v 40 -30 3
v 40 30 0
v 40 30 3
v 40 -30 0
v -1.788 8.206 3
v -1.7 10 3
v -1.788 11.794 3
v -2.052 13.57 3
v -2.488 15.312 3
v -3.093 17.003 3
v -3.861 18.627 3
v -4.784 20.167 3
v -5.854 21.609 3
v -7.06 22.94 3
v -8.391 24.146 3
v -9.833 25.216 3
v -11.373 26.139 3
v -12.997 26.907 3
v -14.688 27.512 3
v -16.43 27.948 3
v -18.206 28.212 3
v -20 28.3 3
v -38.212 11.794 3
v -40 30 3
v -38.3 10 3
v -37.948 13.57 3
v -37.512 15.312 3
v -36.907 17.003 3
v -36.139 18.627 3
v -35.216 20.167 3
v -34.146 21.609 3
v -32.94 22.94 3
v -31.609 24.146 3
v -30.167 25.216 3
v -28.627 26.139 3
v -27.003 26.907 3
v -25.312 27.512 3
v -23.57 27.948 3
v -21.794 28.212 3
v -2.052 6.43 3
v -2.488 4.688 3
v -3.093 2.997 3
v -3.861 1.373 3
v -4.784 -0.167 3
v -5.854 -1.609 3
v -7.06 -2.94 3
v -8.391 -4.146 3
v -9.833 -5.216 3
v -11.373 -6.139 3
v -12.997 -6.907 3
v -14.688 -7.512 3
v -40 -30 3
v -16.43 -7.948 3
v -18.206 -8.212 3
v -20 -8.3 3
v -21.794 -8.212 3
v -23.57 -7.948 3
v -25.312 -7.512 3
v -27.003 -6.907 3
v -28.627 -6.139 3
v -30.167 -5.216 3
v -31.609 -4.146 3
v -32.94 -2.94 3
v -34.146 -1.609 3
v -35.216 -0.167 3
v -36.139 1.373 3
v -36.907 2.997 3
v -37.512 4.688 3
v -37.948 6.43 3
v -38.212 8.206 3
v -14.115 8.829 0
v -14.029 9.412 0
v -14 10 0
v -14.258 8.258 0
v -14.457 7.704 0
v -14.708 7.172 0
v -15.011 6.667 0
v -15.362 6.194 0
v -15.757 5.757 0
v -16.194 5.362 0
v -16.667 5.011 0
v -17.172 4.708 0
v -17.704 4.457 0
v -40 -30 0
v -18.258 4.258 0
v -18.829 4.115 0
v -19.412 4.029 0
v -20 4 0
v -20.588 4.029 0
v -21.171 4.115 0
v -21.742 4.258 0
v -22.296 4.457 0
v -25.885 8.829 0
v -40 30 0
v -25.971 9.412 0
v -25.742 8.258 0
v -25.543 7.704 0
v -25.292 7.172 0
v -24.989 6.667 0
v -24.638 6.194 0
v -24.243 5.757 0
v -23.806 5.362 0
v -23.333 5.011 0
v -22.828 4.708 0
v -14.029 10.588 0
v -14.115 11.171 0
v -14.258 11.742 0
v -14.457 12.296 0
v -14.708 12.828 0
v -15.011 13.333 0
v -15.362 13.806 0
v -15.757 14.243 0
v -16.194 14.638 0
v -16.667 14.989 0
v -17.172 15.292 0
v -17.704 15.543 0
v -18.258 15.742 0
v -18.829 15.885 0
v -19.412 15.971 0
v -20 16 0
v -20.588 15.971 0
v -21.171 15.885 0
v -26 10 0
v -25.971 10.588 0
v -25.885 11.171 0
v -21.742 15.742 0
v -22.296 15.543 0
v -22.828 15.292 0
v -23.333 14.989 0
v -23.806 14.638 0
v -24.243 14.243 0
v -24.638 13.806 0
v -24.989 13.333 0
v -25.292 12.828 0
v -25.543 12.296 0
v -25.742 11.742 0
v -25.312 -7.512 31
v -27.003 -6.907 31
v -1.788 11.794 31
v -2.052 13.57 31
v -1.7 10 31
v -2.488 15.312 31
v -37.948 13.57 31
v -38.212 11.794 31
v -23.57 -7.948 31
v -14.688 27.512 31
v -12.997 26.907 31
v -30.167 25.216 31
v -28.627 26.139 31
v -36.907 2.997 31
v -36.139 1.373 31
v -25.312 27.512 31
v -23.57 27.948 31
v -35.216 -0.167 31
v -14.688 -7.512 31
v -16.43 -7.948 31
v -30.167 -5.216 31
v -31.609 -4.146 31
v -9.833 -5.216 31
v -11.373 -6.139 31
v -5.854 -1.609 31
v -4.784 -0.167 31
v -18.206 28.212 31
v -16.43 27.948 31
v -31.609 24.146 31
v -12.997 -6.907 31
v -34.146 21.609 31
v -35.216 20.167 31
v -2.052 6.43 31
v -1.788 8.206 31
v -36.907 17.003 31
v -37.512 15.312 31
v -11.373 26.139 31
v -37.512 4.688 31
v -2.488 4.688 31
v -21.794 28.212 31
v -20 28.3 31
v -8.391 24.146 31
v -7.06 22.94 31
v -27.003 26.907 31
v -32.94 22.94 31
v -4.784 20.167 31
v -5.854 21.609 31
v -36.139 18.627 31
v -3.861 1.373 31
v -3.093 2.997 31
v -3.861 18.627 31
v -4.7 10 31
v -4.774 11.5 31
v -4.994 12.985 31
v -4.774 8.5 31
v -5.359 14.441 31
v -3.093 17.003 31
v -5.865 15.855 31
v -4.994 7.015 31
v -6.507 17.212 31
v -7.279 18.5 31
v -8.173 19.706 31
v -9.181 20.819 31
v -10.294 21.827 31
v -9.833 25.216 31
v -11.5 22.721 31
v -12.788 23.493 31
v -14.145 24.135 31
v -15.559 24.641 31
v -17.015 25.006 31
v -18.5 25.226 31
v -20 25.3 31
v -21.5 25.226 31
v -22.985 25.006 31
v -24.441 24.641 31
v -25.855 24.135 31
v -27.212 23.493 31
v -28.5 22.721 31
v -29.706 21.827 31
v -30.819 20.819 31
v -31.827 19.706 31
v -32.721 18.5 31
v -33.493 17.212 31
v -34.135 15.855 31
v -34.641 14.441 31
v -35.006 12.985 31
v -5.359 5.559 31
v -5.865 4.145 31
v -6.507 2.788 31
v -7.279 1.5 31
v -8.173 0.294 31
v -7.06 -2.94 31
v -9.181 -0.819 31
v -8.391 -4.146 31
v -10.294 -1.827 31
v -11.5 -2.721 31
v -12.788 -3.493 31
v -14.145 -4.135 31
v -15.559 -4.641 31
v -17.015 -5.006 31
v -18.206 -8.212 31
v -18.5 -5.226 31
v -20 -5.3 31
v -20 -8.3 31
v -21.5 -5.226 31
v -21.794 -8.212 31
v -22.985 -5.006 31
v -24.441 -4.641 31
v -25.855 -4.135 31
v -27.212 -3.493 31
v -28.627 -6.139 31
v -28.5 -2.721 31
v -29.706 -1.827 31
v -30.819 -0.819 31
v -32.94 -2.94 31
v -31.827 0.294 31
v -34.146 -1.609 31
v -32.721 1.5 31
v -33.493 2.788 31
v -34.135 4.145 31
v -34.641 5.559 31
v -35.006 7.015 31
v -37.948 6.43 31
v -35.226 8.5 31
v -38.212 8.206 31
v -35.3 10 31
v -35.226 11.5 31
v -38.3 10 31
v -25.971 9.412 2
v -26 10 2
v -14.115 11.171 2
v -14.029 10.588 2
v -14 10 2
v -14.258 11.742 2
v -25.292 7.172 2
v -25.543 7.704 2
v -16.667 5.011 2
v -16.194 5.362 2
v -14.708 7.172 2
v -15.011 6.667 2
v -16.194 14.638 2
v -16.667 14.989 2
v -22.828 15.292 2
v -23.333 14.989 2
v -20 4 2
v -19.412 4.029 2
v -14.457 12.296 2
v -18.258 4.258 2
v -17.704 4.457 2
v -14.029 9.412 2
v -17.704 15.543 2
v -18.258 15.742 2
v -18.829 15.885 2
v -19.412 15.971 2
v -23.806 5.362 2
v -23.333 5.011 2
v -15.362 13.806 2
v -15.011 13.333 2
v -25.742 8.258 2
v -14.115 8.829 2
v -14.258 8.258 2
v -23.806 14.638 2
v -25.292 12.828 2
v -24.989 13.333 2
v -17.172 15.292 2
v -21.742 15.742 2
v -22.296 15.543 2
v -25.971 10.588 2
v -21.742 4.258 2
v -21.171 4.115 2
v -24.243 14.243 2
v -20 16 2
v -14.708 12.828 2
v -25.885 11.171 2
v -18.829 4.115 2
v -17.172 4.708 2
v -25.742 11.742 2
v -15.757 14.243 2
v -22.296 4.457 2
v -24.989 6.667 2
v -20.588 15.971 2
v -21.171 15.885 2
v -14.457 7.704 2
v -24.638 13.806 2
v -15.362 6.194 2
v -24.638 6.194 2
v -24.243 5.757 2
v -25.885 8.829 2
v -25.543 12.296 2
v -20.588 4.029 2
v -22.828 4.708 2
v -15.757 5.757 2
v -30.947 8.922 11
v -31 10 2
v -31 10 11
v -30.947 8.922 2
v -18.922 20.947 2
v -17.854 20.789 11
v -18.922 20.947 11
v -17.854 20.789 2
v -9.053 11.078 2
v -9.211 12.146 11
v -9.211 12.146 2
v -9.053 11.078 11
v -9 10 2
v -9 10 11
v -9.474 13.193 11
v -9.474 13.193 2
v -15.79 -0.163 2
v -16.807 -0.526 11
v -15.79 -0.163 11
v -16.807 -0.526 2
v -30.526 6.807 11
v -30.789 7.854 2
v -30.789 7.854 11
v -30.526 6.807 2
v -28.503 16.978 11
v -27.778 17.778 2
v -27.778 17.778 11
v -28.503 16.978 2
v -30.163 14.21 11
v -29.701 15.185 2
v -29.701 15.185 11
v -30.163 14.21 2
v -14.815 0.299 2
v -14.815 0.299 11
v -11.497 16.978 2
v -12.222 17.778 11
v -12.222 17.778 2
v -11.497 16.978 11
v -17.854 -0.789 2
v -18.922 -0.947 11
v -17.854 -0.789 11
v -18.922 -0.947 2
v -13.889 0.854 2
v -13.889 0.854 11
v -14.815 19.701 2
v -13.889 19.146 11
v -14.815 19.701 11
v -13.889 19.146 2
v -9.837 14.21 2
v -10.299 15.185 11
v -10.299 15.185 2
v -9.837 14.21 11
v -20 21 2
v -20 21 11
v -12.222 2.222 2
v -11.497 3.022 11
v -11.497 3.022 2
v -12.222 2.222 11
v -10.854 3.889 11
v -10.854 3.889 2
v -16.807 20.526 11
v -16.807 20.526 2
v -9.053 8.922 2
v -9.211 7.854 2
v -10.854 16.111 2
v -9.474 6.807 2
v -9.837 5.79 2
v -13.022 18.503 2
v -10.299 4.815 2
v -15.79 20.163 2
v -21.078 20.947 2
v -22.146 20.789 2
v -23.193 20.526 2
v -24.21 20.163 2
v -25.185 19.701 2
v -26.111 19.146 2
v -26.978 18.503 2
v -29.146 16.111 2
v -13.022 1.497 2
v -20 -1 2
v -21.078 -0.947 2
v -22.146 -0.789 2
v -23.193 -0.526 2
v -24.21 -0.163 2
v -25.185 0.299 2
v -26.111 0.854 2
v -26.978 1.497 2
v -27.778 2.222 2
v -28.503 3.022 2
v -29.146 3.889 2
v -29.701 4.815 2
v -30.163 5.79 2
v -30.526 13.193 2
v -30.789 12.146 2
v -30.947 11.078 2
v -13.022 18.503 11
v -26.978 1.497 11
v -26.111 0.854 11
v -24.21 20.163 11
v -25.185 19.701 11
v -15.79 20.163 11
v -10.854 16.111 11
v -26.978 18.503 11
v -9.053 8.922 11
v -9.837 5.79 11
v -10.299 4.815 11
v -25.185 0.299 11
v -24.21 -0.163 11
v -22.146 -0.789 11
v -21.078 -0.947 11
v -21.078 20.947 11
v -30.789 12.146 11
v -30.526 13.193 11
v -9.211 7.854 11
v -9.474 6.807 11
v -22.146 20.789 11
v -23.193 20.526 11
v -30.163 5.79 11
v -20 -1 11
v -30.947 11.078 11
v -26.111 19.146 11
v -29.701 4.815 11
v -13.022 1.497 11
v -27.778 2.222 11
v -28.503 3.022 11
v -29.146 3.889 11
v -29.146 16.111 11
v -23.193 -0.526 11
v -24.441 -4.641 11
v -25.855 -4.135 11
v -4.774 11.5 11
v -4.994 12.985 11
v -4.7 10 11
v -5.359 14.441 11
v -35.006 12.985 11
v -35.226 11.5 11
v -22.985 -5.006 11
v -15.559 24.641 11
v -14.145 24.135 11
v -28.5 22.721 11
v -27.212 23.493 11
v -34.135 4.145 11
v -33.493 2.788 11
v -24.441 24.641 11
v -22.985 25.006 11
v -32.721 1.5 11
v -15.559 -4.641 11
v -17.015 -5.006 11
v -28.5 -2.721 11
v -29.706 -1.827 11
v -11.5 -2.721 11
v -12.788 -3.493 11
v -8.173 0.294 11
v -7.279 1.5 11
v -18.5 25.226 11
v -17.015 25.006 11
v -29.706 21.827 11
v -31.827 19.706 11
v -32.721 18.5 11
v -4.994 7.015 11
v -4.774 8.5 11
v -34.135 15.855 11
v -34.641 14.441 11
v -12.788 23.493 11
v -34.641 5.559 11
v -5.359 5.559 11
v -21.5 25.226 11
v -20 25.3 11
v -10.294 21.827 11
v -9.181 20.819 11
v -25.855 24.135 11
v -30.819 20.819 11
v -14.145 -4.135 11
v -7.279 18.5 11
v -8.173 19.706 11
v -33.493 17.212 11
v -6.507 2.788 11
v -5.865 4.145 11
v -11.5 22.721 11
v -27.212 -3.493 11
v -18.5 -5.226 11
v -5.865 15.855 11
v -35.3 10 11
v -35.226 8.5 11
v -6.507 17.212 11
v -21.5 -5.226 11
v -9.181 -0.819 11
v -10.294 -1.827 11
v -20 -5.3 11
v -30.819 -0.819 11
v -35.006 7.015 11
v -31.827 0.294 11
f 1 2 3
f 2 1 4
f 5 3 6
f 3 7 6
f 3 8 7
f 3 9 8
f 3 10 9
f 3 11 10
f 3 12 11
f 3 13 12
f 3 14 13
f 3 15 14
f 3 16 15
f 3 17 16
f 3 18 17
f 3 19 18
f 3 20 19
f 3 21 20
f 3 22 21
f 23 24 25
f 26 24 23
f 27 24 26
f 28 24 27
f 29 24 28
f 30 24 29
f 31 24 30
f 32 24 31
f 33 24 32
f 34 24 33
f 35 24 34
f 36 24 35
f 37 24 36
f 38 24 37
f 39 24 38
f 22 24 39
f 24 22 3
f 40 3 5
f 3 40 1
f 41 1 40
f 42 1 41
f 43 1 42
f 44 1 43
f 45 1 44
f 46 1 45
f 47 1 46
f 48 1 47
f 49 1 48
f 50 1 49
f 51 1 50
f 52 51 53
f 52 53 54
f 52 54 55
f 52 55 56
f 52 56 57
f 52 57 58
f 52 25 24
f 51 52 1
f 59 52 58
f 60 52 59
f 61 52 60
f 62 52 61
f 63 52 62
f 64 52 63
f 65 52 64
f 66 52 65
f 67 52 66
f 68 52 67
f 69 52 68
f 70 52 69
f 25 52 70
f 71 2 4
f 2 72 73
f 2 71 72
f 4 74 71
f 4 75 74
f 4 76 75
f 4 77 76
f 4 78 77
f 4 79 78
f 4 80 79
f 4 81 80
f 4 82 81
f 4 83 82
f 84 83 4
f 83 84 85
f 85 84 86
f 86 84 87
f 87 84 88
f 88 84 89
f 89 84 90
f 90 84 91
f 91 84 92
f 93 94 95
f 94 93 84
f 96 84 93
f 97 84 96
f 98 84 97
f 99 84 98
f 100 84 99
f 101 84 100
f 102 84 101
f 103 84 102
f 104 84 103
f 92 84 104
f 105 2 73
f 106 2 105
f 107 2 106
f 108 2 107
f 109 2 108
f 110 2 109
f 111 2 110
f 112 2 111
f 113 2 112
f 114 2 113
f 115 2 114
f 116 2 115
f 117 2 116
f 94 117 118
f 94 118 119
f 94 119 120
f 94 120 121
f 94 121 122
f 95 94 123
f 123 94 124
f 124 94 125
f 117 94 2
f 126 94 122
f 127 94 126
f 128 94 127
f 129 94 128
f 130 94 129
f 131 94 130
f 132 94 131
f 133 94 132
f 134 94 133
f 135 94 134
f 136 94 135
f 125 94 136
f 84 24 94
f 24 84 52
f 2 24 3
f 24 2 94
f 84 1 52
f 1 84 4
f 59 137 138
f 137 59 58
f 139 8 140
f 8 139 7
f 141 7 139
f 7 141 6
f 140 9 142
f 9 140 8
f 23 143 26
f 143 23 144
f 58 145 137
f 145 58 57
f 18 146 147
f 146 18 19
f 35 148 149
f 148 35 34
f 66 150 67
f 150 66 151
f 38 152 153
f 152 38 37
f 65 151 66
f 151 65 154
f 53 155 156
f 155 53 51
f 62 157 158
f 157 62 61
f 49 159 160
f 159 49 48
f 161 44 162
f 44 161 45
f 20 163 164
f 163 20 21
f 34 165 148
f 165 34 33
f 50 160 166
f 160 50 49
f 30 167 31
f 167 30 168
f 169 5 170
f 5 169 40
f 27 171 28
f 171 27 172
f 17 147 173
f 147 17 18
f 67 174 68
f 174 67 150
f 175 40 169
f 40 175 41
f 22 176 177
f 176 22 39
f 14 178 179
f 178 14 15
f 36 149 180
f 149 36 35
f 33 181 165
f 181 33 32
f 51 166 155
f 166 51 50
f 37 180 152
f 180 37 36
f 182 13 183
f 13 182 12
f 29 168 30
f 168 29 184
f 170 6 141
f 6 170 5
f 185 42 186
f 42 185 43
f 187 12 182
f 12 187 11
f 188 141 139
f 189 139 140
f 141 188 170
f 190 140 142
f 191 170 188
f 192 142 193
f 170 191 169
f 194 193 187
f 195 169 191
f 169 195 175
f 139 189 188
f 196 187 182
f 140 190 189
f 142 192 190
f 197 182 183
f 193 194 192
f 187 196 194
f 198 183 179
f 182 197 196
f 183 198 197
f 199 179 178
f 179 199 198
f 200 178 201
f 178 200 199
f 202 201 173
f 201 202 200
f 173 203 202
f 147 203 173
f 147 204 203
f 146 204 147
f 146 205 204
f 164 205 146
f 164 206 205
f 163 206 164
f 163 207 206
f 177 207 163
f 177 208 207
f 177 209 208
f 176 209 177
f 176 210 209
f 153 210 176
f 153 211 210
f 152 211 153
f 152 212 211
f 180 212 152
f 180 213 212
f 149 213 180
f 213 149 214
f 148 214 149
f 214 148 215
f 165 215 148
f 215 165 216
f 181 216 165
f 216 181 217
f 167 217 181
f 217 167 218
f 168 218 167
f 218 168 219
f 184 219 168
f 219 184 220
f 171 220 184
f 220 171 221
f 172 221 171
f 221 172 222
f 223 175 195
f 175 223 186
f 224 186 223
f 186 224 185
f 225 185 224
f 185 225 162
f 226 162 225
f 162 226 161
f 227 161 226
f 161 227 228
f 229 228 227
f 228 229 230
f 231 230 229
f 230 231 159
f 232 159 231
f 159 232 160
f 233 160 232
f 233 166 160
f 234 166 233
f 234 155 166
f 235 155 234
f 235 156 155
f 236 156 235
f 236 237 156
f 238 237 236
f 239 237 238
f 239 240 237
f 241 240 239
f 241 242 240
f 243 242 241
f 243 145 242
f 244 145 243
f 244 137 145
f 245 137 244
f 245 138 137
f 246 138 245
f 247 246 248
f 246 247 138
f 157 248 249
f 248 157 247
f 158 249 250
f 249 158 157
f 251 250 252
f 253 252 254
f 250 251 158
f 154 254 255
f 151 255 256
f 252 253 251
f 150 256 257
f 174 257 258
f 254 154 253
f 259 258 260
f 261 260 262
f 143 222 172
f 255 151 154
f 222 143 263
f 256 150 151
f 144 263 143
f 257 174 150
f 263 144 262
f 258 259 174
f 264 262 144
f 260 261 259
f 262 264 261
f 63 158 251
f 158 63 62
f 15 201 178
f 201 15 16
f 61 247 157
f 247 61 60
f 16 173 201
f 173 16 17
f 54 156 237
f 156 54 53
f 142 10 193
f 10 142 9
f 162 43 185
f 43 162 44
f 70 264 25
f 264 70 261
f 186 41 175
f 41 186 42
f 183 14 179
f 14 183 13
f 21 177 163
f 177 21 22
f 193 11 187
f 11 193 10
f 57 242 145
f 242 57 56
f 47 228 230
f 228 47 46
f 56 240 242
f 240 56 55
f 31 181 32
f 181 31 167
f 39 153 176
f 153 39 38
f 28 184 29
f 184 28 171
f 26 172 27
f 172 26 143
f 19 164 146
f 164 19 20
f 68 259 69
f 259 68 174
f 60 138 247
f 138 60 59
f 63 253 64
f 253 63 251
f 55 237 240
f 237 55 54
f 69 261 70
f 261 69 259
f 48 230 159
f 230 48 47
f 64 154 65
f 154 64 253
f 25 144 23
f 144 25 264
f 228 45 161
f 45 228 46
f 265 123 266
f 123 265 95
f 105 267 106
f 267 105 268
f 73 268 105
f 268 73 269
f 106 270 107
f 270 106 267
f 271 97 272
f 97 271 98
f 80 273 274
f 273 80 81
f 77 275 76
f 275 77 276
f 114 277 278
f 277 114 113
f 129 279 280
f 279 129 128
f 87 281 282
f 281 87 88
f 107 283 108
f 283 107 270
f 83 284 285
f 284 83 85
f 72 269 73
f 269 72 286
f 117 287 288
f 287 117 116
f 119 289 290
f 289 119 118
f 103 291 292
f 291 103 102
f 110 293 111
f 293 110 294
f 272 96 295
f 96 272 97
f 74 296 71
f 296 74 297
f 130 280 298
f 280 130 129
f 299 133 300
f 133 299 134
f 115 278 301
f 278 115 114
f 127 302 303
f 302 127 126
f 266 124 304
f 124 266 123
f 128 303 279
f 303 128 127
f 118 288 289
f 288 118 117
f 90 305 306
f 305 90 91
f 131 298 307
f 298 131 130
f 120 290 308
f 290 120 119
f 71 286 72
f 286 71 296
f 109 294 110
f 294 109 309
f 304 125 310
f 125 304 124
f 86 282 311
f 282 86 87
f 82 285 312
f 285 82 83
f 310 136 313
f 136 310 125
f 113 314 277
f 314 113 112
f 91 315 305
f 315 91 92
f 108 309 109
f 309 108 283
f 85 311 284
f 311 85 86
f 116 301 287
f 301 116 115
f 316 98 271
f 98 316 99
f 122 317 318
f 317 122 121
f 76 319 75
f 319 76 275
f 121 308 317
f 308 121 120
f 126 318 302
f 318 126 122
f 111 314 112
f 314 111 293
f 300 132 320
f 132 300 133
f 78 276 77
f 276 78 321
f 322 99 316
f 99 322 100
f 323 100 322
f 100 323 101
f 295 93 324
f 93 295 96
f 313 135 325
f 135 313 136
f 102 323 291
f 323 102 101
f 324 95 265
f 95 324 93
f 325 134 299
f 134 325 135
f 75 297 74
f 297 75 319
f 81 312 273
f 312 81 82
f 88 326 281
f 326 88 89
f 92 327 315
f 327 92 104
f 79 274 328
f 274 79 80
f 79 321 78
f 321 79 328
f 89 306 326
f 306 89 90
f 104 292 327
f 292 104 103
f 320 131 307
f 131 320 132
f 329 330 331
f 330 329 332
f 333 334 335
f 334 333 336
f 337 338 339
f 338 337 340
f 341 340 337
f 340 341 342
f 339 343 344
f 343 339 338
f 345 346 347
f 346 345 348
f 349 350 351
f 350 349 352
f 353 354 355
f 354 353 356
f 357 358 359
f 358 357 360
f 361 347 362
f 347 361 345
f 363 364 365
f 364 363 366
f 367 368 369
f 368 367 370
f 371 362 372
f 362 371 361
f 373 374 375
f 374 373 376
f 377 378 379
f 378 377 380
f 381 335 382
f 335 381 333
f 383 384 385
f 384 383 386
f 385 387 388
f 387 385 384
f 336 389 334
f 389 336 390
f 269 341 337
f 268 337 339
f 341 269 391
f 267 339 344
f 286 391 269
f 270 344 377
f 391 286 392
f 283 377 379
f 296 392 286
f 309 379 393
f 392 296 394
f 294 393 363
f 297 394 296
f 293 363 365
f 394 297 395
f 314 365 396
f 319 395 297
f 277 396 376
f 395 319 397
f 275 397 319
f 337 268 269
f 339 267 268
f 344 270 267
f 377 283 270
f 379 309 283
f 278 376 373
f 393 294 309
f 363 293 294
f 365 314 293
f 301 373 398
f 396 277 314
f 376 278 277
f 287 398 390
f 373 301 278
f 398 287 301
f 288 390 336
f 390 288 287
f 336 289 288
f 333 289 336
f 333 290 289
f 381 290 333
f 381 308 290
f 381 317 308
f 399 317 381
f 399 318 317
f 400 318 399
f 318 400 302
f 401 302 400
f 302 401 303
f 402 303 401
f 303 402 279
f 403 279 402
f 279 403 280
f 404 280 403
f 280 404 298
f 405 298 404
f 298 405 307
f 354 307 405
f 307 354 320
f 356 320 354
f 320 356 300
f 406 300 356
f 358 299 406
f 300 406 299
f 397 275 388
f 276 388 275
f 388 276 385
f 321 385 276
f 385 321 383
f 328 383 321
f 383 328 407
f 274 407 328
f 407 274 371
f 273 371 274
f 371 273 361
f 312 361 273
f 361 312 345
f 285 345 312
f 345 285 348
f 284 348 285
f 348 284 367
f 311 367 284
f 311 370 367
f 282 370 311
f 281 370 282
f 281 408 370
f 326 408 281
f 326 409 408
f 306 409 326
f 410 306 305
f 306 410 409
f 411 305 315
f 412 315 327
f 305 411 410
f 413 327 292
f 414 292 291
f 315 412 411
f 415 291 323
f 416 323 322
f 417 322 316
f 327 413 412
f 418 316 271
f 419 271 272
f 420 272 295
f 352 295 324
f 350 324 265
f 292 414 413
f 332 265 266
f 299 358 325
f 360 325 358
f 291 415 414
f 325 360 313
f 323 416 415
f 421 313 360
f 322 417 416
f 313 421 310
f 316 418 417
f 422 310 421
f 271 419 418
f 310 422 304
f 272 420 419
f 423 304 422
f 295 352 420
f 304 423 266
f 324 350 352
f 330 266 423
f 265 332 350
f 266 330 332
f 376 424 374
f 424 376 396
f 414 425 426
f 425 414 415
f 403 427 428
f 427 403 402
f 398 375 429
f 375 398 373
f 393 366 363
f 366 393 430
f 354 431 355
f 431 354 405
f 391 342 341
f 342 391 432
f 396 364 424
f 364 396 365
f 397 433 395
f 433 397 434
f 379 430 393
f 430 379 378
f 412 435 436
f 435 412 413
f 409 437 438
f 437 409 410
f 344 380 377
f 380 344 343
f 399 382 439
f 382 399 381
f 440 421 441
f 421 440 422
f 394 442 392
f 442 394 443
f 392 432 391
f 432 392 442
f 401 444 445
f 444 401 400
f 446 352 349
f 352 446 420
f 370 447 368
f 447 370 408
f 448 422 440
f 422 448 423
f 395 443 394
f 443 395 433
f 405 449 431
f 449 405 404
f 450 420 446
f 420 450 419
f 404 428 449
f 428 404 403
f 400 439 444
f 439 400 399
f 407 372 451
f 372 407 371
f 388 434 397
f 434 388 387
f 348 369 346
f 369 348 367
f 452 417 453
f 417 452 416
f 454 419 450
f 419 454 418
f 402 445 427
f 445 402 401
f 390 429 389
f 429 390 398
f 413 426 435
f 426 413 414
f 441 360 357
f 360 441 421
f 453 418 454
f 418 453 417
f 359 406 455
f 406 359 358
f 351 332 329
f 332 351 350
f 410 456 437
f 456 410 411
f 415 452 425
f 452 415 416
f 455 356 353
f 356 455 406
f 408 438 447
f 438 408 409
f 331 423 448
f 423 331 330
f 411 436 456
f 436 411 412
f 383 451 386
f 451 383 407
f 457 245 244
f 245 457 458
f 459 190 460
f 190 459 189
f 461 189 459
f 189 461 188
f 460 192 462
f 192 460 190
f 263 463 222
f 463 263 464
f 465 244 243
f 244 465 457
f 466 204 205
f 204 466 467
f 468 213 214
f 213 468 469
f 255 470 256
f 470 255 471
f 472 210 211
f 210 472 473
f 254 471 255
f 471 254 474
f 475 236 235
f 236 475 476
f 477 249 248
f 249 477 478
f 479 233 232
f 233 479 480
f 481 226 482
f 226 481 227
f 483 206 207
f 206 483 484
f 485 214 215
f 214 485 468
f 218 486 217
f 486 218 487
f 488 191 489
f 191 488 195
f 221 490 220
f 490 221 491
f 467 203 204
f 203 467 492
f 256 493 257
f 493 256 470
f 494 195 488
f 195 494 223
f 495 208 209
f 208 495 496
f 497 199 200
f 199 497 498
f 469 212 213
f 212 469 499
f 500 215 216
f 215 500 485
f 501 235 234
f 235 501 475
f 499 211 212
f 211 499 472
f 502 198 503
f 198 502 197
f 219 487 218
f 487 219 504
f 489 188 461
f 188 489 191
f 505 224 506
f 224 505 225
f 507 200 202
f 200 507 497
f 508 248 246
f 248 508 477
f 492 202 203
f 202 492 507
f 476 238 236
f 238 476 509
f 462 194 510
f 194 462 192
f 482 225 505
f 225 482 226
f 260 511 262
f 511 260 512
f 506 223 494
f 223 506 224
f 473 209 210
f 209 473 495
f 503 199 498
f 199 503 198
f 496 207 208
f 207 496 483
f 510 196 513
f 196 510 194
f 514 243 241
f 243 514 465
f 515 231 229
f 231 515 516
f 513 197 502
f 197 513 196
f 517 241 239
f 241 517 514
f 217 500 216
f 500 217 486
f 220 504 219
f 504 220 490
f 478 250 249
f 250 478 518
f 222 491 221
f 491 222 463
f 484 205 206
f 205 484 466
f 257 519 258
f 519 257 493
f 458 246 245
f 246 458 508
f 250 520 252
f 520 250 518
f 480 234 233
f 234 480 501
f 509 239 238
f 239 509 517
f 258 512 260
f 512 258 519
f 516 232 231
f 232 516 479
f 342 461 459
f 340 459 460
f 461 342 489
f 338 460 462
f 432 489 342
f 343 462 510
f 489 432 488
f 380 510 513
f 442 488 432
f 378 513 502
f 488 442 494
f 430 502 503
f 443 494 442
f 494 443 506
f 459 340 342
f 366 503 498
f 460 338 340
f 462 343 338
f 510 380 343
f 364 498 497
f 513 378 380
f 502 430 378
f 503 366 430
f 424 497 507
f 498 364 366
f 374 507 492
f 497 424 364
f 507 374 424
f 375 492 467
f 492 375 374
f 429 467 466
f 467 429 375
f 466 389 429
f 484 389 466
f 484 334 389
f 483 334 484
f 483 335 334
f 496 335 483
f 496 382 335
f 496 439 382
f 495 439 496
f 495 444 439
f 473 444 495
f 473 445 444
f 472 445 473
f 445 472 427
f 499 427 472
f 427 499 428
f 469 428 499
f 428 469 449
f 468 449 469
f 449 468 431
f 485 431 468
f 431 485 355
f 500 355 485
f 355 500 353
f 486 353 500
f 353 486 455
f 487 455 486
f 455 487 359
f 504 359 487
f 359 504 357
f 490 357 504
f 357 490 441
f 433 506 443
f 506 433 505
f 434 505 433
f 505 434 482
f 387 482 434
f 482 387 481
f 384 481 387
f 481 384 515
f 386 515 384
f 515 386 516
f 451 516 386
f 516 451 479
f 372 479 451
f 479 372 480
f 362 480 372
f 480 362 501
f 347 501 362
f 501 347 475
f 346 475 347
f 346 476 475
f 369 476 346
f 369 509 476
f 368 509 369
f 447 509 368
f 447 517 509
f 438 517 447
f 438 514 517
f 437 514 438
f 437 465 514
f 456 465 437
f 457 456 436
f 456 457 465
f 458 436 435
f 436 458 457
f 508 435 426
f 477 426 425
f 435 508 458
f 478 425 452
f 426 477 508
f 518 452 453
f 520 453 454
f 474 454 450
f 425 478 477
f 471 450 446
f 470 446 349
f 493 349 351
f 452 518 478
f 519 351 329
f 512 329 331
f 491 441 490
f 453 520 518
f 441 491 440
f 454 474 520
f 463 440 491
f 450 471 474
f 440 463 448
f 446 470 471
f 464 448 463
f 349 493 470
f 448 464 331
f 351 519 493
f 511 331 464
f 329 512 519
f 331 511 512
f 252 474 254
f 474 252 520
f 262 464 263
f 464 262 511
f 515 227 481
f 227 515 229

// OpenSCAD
// Adapter: phone camera over microscope eyepiece (30 mm OD), printed phone-side down
// All dimensions in mm, measured with calipers.

// ---- Plate ----
plate_x = 80;   // plate length in X
plate_y = 60;   // plate width in Y
plate_t = 3;    // plate thickness (z = 0..3)
cam_hole_d = 12;    // camera through-hole diameter
cam_hole_x = -20;   // camera hole centre X
cam_hole_y = 10;    // camera hole centre Y

// ---- Sleeve (on camera-hole axis) ----
sleeve_od = 36.6;   // sleeve outer diameter
sleeve_z0 = 3;      // sleeve base (sits on plate top)
sleeve_z1 = 31;     // sleeve top (open)
bore1_d = 22;       // lower bore (camera stop) diameter
bore1_z0 = 3;       // lower bore start
bore1_z1 = 11;      // lower bore end
bore2_d = 30.6;     // upper bore (slides over 30 mm eyepiece) diameter
bore2_z0 = 11;      // upper bore start
bore2_z1 = 31;      // upper bore end (open top)

// ---- M3 centring screw holes ----
screw_hole_d = 2.5;   // radial hole diameter
screw_z = 21;         // hole axis height
screw_n = 3;          // number of radial holes
screw_start = 0;      // first hole points +X

$fn = 64;

// ===================== BODY =====================
module body() { union() {
    // Flat plate on the bed, centred on origin
    translate([-plate_x/2, -plate_y/2, 0])
        cube([plate_x, plate_y, plate_t]);

    // Round sleeve standing on the plate, on the camera-hole axis
    translate([cam_hole_x, cam_hole_y, 0])
        cylinder(h = sleeve_z1, d = sleeve_od, center = false);
} }

// ===================== CUTS =====================
module cuts() { union() {
    // Camera through-hole in the plate (extends 1 mm past each face)
    translate([cam_hole_x, cam_hole_y, -1])
        cylinder(h = plate_t + 2, d = cam_hole_d, center = false);

    // Lower bore (camera stop) - extends 1 mm below plate and 0.5 mm into upper bore
    translate([cam_hole_x, cam_hole_y, bore1_z0 - 1])
        cylinder(h = (bore1_z1 - bore1_z0) + 1.5, d = bore1_d, center = false);

    // Upper bore (slides over eyepiece) - extends 1 mm past open top
    translate([cam_hole_x, cam_hole_y, bore2_z0])
        cylinder(h = (bore2_z1 - bore2_z0) + 1, d = bore2_d, center = false);

    // Three radial 2.5 mm M3 centring-screw holes, 120 deg apart, first in +X
    for (i = [0 : screw_n - 1]) {
        a = screw_start + i * 360 / screw_n;
        // Cylinder axis along local X, rotated about Z by a, centred on sleeve axis
        translate([cam_hole_x, cam_hole_y, screw_z])
        rotate([0, 0, a])
        // Extend 1 mm past the sleeve outer wall on each side
        cylinder(h = sleeve_od + 2, d = screw_hole_d, center = true);
    }
} }

// ===================== FINAL PART =====================
difference() {
    body();
    cuts();
}
